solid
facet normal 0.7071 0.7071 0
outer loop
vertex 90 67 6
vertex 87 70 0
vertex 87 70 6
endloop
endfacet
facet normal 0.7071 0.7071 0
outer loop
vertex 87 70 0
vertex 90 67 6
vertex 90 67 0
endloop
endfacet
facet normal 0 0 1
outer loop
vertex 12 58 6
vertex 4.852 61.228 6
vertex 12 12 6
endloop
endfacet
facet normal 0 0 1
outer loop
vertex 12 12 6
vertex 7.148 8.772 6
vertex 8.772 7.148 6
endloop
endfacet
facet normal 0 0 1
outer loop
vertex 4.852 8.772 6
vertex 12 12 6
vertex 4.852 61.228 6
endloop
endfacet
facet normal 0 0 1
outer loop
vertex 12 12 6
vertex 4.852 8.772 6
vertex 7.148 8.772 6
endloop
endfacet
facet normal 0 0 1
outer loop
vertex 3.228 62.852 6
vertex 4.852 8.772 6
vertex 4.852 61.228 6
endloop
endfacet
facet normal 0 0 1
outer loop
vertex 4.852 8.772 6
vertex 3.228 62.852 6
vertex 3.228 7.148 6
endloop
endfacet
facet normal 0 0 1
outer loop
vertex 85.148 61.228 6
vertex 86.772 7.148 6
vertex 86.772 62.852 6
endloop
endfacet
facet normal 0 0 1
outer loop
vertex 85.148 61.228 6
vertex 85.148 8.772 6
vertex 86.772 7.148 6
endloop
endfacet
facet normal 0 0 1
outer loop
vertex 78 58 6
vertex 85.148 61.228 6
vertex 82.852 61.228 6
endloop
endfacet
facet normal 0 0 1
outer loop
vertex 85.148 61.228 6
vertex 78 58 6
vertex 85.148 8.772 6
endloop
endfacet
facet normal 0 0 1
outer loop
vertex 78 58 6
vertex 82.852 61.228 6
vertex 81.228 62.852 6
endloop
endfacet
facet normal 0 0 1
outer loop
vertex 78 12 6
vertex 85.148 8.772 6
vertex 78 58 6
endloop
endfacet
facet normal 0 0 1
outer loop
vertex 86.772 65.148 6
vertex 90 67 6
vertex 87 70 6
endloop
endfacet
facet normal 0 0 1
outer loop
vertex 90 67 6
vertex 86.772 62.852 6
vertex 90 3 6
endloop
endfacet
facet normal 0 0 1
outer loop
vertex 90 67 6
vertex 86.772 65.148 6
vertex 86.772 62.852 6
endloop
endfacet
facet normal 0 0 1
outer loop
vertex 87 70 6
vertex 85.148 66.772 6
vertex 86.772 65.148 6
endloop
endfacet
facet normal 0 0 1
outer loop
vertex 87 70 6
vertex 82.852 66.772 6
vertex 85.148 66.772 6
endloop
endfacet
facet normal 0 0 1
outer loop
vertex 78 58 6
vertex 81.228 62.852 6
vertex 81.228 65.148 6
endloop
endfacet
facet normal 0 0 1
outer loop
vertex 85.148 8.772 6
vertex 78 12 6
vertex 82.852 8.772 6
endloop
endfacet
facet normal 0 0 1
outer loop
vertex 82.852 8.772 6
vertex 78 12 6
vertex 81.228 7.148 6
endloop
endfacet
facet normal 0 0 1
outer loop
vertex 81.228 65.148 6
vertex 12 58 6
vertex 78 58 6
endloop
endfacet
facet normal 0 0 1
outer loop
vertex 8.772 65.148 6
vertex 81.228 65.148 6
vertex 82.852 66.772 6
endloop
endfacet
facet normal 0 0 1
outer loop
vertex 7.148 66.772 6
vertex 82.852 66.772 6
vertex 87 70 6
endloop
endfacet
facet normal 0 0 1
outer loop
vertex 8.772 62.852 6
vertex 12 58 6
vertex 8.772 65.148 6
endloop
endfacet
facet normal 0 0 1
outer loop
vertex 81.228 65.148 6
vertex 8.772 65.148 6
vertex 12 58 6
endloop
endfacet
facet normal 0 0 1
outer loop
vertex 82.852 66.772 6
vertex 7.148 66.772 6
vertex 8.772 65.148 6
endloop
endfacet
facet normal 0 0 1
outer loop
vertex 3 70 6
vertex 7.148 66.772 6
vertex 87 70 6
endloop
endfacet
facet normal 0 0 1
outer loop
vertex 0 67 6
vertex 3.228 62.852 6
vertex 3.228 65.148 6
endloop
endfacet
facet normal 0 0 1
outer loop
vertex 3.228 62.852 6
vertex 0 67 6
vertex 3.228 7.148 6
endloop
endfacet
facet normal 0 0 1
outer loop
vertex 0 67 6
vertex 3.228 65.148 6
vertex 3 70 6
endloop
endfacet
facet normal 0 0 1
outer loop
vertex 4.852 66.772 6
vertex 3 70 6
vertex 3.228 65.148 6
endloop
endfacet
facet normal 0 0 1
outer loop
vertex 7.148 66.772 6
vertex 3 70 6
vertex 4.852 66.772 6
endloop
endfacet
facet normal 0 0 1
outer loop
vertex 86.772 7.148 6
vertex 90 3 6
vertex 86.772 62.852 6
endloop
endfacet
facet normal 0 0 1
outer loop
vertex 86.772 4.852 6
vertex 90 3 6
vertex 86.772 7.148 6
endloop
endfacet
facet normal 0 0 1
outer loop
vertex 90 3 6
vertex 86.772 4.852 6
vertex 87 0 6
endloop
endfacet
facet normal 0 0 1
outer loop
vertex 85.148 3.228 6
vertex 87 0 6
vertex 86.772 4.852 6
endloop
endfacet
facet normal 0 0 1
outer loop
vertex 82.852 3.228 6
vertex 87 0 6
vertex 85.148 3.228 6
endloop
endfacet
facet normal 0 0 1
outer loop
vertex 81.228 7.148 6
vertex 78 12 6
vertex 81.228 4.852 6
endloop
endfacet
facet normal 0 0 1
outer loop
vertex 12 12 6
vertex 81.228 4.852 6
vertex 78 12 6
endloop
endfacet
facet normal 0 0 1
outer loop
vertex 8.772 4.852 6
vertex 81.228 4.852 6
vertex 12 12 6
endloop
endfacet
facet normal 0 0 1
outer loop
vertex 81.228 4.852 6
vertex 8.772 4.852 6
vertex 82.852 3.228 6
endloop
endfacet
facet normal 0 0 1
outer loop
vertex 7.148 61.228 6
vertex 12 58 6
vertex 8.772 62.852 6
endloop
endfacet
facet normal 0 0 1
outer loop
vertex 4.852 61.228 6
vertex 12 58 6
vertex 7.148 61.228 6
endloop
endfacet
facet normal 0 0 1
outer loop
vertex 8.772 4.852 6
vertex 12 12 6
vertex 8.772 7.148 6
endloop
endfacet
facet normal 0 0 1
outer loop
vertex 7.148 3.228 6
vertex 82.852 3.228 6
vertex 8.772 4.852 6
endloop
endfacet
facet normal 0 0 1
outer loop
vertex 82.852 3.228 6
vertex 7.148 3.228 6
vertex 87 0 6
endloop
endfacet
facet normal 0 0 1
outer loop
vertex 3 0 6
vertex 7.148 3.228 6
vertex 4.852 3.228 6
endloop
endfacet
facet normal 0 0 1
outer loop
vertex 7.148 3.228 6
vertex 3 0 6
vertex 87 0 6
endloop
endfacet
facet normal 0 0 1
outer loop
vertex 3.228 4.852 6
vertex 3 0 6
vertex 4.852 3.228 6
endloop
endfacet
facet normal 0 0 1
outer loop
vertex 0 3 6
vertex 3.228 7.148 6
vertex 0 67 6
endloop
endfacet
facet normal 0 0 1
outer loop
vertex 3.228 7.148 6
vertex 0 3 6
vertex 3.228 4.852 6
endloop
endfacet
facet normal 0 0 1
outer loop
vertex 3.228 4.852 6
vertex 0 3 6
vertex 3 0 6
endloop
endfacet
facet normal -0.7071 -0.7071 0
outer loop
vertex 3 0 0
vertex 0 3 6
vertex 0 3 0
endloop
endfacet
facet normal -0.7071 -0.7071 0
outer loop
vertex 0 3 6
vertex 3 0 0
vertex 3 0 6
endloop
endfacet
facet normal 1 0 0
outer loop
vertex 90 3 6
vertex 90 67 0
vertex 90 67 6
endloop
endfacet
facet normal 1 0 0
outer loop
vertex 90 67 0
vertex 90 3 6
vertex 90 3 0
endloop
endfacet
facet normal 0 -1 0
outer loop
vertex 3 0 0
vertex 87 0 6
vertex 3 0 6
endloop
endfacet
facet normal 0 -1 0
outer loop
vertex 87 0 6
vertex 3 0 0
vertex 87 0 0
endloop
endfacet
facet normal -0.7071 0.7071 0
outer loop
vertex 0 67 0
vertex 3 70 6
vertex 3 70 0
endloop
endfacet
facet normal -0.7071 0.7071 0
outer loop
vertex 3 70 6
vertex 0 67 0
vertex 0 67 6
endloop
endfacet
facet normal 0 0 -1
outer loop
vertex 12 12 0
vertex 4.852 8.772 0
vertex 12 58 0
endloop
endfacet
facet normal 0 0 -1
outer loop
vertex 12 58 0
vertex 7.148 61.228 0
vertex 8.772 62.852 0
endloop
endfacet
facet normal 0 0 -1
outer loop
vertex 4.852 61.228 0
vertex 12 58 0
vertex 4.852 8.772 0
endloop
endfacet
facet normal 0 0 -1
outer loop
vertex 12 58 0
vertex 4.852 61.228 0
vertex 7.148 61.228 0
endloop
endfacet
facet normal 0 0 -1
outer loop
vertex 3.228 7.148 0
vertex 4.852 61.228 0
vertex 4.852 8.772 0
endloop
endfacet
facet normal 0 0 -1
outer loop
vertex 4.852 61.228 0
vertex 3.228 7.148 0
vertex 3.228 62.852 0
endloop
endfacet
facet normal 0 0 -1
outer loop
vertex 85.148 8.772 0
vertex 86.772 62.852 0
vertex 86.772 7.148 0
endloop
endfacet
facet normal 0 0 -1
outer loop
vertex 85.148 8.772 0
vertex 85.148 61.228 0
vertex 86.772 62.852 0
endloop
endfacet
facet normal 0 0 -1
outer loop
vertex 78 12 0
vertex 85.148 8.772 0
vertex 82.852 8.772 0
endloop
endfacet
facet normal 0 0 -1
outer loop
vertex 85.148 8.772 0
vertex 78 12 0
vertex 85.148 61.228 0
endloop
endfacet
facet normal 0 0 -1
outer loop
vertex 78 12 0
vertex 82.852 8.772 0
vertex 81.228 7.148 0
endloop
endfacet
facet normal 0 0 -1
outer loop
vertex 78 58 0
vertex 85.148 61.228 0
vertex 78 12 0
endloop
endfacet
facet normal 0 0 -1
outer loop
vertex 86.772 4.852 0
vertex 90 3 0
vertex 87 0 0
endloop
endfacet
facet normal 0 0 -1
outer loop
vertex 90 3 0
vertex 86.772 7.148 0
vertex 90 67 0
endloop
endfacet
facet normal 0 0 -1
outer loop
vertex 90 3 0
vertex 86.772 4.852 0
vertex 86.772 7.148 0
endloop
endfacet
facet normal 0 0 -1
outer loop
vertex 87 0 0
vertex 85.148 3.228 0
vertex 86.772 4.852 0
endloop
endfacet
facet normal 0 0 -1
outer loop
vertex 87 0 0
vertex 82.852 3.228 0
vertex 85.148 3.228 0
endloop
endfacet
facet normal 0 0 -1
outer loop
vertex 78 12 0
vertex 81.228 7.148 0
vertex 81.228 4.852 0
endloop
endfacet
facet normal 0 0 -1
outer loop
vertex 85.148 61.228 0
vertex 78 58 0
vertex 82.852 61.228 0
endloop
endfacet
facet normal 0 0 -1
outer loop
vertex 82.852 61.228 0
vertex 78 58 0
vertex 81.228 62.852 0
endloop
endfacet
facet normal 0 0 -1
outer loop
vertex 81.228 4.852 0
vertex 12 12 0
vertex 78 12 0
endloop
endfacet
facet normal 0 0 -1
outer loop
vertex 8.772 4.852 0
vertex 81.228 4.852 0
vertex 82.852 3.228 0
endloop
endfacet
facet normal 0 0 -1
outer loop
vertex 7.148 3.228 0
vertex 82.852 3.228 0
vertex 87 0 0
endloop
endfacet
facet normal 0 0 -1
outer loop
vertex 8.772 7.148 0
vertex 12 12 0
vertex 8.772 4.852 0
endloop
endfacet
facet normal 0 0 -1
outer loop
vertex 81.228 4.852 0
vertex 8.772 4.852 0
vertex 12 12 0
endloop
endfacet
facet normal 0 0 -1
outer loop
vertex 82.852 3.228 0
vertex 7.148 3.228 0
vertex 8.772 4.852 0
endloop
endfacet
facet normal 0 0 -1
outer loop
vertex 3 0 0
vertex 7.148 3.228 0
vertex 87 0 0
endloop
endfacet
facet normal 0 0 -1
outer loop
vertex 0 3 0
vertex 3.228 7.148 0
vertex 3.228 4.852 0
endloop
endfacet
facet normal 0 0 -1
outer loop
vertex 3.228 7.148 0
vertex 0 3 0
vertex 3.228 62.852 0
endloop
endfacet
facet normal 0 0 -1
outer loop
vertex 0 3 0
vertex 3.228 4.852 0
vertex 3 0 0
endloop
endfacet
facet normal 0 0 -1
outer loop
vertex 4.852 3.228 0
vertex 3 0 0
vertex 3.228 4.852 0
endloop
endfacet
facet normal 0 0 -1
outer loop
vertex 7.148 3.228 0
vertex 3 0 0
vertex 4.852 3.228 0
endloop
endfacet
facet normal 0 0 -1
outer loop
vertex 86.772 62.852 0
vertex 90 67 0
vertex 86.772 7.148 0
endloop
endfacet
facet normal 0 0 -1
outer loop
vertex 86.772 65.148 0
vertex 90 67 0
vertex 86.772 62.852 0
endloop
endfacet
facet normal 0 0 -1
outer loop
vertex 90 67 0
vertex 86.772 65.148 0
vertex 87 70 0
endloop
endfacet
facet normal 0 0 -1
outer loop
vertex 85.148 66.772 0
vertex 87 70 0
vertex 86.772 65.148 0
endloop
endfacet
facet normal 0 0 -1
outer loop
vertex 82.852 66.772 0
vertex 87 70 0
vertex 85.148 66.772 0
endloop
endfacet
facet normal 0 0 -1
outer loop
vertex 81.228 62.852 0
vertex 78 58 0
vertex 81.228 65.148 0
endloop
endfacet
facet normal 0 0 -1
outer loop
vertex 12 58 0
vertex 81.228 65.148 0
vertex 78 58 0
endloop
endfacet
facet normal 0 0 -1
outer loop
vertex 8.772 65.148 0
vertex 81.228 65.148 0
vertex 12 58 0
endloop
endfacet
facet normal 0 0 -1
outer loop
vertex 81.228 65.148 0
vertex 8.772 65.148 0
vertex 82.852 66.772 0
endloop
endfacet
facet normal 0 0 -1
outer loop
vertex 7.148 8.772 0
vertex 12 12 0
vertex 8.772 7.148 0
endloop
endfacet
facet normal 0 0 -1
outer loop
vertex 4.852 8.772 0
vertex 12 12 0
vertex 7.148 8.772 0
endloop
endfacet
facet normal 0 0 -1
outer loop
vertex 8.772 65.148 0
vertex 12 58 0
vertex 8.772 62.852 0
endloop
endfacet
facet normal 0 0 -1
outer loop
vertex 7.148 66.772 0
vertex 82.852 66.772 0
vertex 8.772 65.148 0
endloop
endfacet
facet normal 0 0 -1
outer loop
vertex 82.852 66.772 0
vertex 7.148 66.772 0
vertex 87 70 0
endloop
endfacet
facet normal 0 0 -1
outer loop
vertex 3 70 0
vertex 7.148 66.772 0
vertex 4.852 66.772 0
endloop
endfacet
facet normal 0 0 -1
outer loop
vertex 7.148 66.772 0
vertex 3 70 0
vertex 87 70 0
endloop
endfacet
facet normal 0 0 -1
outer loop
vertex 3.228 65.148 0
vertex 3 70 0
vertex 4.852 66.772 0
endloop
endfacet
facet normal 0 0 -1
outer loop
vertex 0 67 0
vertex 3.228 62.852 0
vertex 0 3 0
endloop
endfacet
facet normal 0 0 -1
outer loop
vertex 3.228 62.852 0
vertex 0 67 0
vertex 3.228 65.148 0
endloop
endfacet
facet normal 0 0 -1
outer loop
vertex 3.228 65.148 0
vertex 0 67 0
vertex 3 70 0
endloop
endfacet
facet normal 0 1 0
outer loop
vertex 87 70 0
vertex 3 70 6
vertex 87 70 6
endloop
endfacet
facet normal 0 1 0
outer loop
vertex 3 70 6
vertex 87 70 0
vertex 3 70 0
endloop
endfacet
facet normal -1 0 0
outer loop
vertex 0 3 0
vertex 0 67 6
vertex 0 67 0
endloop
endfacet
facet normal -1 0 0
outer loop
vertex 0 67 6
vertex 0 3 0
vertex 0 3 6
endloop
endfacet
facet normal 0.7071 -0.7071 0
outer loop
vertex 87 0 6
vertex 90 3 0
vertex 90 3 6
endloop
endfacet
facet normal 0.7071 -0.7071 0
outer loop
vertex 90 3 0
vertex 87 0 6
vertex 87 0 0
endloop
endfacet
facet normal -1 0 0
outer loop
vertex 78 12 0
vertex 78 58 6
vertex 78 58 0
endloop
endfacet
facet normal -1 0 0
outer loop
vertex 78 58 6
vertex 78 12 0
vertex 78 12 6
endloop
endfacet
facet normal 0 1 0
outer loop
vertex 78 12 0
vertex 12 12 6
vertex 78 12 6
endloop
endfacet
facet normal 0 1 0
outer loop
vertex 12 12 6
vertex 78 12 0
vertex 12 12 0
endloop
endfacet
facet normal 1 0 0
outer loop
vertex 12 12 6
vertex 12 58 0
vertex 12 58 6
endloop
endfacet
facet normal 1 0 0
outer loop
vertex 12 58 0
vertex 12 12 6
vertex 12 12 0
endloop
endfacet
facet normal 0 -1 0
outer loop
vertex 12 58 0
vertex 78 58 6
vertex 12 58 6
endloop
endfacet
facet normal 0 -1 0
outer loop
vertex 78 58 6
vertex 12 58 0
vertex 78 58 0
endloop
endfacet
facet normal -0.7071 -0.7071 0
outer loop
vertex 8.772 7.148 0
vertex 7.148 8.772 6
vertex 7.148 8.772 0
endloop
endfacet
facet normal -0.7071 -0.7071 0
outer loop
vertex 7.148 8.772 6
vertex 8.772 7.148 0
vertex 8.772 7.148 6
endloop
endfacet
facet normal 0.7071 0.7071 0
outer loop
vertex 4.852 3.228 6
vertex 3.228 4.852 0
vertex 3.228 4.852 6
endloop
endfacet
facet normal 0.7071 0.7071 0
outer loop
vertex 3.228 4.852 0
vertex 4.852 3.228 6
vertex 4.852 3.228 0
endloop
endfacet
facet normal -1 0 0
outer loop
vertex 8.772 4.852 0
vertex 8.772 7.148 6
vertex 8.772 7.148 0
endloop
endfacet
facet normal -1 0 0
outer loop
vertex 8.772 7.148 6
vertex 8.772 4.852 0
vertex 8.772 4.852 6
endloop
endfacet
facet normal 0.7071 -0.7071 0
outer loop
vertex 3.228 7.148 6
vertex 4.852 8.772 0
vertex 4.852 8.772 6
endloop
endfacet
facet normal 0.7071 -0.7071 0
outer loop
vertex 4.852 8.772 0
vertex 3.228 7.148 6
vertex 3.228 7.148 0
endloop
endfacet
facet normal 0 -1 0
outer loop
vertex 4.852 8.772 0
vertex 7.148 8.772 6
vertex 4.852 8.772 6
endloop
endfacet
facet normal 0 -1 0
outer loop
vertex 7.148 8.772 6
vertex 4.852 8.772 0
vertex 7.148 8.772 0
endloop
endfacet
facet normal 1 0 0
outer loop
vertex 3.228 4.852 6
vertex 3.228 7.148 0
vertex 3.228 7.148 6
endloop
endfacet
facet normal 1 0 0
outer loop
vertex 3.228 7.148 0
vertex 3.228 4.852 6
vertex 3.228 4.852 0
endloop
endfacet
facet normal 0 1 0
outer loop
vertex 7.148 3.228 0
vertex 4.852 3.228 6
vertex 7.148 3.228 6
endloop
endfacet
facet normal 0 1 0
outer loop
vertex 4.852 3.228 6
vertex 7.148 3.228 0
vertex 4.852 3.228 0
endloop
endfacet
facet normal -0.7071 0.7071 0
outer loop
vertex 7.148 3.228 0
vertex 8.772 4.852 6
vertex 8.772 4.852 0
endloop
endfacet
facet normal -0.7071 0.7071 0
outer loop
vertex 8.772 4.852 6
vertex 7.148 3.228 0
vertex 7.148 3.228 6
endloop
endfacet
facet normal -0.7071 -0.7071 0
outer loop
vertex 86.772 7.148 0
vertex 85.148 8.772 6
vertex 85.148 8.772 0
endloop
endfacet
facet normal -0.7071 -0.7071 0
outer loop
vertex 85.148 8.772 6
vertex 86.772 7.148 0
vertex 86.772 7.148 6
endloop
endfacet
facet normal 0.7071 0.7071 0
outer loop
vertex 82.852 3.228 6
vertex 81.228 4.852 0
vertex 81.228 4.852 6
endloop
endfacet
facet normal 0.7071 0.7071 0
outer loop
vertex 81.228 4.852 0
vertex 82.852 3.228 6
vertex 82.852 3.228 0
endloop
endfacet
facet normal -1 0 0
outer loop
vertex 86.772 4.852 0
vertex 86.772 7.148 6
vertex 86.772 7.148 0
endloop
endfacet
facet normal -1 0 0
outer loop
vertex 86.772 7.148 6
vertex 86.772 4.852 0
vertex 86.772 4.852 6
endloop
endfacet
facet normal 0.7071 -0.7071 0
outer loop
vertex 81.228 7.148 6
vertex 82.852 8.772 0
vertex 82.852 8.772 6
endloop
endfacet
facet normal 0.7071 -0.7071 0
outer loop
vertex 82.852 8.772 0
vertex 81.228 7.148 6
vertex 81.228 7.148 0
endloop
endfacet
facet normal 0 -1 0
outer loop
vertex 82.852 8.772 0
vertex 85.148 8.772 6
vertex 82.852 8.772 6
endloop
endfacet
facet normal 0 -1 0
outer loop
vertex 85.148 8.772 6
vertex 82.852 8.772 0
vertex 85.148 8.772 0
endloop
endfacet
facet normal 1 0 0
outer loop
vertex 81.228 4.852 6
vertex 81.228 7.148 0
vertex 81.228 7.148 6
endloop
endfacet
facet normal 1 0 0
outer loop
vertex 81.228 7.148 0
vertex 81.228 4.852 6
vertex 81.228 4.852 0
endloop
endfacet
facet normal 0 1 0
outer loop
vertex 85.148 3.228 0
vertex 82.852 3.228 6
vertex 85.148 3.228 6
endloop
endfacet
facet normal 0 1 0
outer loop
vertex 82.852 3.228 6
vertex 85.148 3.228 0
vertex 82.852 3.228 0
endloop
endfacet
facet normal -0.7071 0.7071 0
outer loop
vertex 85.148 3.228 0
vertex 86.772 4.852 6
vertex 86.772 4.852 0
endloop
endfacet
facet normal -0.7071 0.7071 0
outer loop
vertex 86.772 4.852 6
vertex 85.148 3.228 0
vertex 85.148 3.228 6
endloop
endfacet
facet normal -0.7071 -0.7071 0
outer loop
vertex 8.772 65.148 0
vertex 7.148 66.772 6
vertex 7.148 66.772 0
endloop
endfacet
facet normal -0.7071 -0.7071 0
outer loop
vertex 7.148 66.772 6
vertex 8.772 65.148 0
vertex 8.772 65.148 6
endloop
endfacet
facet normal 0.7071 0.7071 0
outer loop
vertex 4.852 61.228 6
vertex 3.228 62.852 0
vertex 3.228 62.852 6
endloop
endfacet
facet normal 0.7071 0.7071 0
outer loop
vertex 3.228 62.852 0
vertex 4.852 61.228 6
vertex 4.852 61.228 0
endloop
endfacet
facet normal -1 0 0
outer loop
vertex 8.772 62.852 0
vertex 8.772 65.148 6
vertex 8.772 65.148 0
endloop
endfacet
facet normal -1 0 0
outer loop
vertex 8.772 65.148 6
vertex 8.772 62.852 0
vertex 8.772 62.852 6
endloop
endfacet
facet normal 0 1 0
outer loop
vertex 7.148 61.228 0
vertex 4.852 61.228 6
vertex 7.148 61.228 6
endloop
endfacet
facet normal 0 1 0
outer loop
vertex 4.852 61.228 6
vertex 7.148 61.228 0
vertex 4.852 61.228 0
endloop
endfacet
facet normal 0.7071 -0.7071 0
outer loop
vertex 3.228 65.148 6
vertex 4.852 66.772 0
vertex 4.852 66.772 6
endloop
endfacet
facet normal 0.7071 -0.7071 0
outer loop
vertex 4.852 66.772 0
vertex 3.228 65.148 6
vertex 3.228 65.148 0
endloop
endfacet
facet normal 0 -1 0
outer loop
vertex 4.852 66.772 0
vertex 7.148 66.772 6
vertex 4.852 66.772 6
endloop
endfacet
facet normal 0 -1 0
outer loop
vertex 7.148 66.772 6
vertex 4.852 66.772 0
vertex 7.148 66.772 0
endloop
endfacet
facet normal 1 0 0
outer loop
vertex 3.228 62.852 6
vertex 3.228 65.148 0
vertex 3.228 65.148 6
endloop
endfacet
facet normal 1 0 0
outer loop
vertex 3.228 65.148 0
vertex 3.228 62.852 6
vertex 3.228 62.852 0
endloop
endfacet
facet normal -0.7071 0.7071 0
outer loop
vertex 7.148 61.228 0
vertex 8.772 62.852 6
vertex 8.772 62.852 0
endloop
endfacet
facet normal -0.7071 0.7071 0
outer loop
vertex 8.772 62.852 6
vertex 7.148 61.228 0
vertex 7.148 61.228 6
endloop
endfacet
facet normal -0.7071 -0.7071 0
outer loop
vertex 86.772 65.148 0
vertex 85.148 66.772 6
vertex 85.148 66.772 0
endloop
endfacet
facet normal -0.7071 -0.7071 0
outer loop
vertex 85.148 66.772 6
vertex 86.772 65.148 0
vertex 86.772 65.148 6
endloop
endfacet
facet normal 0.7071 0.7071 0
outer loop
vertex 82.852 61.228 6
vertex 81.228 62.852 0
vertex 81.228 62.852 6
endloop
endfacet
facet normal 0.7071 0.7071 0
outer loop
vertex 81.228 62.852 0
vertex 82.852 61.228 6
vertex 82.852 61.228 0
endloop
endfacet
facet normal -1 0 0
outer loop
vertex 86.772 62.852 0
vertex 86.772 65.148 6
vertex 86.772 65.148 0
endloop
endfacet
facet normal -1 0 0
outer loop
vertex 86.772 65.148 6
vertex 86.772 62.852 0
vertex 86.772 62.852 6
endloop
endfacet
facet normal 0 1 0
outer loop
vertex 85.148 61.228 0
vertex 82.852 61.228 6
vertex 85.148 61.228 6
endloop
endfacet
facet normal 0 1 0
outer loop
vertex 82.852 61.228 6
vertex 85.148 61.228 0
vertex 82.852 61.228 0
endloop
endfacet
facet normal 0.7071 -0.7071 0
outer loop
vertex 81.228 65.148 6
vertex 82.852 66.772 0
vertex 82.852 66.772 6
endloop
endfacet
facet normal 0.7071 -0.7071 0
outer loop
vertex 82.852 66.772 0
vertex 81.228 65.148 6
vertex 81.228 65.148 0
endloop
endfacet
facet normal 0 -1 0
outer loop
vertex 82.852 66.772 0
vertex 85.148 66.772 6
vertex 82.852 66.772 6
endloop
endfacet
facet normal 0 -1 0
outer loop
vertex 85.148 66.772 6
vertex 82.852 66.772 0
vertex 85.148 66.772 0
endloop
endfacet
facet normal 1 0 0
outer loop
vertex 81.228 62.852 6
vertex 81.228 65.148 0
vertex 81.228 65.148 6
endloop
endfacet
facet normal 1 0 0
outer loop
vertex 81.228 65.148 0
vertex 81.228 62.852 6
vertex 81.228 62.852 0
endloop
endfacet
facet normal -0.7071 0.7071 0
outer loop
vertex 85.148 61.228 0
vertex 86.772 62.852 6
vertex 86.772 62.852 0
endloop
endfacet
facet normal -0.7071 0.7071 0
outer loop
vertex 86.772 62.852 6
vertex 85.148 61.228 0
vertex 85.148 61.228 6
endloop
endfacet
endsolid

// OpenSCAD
$fn = 32;

// ----------------------------------------------------------------------
// Frame plate: 90 x 70 frame, 12 mm rails
// ----------------------------------------------------------------------

// --- parameters (mm) ---
plate_l = 90;             // plate length, X
plate_w = 70;             // plate width, Y
plate_t = 6;              // plate thickness, Z (extrusion height)
corner_c = 3;             // corner chamfer
frame_bar = 12;           // frame rail width
bolt_r = 3;               // corner bolt window radius
bolt_inset = 6;           // bolt centre inset from the edges
fit_tol = 0.05;           // declared fit tolerance (prompt contract)
free_tol = 0.3;           // declared free tolerance (prompt contract)

win_l = plate_l - 2 * frame_bar;  // window length
win_w = plate_w - 2 * frame_bar;  // window width
bolt_d = 2 * bolt_r;  // corner hole diameter

profile = [[3, 0], [87, 0], [90, 3], [90, 67], [87, 70], [3, 70], [0, 67], [0, 3]];  // primary outline, 8 points, counter clockwise
void_1 = [[12, 12], [78, 12], [78, 58], [12, 58]];  // the window, 4 points
void_2 = [[8.772, 7.148], [7.148, 8.772], [4.852, 8.772], [3.228, 7.148], [3.228, 4.852], [4.852, 3.228], [7.148, 3.228], [8.772, 4.852]];  // corner bolt window, 8 points
void_3 = [[86.772, 7.148], [85.148, 8.772], [82.852, 8.772], [81.228, 7.148], [81.228, 4.852], [82.852, 3.228], [85.148, 3.228], [86.772, 4.852]];  // corner bolt window, 8 points
void_4 = [[8.772, 65.148], [7.148, 66.772], [4.852, 66.772], [3.228, 65.148], [3.228, 62.852], [4.852, 61.228], [7.148, 61.228], [8.772, 62.852]];  // corner bolt window, 8 points
void_5 = [[86.772, 65.148], [85.148, 66.772], [82.852, 66.772], [81.228, 65.148], [81.228, 62.852], [82.852, 61.228], [85.148, 61.228], [86.772, 62.852]];  // corner bolt window, 8 points

// --- the one profile operation ---
difference() {
  linear_extrude(height = plate_t) polygon(points = profile);
  translate([0, 0, -1])
    linear_extrude(height = plate_t + 2) polygon(points = void_1);
  translate([0, 0, -1])
    linear_extrude(height = plate_t + 2) polygon(points = void_2);
  translate([0, 0, -1])
    linear_extrude(height = plate_t + 2) polygon(points = void_3);
  translate([0, 0, -1])
    linear_extrude(height = plate_t + 2) polygon(points = void_4);
  translate([0, 0, -1])
    linear_extrude(height = plate_t + 2) polygon(points = void_5);
}
